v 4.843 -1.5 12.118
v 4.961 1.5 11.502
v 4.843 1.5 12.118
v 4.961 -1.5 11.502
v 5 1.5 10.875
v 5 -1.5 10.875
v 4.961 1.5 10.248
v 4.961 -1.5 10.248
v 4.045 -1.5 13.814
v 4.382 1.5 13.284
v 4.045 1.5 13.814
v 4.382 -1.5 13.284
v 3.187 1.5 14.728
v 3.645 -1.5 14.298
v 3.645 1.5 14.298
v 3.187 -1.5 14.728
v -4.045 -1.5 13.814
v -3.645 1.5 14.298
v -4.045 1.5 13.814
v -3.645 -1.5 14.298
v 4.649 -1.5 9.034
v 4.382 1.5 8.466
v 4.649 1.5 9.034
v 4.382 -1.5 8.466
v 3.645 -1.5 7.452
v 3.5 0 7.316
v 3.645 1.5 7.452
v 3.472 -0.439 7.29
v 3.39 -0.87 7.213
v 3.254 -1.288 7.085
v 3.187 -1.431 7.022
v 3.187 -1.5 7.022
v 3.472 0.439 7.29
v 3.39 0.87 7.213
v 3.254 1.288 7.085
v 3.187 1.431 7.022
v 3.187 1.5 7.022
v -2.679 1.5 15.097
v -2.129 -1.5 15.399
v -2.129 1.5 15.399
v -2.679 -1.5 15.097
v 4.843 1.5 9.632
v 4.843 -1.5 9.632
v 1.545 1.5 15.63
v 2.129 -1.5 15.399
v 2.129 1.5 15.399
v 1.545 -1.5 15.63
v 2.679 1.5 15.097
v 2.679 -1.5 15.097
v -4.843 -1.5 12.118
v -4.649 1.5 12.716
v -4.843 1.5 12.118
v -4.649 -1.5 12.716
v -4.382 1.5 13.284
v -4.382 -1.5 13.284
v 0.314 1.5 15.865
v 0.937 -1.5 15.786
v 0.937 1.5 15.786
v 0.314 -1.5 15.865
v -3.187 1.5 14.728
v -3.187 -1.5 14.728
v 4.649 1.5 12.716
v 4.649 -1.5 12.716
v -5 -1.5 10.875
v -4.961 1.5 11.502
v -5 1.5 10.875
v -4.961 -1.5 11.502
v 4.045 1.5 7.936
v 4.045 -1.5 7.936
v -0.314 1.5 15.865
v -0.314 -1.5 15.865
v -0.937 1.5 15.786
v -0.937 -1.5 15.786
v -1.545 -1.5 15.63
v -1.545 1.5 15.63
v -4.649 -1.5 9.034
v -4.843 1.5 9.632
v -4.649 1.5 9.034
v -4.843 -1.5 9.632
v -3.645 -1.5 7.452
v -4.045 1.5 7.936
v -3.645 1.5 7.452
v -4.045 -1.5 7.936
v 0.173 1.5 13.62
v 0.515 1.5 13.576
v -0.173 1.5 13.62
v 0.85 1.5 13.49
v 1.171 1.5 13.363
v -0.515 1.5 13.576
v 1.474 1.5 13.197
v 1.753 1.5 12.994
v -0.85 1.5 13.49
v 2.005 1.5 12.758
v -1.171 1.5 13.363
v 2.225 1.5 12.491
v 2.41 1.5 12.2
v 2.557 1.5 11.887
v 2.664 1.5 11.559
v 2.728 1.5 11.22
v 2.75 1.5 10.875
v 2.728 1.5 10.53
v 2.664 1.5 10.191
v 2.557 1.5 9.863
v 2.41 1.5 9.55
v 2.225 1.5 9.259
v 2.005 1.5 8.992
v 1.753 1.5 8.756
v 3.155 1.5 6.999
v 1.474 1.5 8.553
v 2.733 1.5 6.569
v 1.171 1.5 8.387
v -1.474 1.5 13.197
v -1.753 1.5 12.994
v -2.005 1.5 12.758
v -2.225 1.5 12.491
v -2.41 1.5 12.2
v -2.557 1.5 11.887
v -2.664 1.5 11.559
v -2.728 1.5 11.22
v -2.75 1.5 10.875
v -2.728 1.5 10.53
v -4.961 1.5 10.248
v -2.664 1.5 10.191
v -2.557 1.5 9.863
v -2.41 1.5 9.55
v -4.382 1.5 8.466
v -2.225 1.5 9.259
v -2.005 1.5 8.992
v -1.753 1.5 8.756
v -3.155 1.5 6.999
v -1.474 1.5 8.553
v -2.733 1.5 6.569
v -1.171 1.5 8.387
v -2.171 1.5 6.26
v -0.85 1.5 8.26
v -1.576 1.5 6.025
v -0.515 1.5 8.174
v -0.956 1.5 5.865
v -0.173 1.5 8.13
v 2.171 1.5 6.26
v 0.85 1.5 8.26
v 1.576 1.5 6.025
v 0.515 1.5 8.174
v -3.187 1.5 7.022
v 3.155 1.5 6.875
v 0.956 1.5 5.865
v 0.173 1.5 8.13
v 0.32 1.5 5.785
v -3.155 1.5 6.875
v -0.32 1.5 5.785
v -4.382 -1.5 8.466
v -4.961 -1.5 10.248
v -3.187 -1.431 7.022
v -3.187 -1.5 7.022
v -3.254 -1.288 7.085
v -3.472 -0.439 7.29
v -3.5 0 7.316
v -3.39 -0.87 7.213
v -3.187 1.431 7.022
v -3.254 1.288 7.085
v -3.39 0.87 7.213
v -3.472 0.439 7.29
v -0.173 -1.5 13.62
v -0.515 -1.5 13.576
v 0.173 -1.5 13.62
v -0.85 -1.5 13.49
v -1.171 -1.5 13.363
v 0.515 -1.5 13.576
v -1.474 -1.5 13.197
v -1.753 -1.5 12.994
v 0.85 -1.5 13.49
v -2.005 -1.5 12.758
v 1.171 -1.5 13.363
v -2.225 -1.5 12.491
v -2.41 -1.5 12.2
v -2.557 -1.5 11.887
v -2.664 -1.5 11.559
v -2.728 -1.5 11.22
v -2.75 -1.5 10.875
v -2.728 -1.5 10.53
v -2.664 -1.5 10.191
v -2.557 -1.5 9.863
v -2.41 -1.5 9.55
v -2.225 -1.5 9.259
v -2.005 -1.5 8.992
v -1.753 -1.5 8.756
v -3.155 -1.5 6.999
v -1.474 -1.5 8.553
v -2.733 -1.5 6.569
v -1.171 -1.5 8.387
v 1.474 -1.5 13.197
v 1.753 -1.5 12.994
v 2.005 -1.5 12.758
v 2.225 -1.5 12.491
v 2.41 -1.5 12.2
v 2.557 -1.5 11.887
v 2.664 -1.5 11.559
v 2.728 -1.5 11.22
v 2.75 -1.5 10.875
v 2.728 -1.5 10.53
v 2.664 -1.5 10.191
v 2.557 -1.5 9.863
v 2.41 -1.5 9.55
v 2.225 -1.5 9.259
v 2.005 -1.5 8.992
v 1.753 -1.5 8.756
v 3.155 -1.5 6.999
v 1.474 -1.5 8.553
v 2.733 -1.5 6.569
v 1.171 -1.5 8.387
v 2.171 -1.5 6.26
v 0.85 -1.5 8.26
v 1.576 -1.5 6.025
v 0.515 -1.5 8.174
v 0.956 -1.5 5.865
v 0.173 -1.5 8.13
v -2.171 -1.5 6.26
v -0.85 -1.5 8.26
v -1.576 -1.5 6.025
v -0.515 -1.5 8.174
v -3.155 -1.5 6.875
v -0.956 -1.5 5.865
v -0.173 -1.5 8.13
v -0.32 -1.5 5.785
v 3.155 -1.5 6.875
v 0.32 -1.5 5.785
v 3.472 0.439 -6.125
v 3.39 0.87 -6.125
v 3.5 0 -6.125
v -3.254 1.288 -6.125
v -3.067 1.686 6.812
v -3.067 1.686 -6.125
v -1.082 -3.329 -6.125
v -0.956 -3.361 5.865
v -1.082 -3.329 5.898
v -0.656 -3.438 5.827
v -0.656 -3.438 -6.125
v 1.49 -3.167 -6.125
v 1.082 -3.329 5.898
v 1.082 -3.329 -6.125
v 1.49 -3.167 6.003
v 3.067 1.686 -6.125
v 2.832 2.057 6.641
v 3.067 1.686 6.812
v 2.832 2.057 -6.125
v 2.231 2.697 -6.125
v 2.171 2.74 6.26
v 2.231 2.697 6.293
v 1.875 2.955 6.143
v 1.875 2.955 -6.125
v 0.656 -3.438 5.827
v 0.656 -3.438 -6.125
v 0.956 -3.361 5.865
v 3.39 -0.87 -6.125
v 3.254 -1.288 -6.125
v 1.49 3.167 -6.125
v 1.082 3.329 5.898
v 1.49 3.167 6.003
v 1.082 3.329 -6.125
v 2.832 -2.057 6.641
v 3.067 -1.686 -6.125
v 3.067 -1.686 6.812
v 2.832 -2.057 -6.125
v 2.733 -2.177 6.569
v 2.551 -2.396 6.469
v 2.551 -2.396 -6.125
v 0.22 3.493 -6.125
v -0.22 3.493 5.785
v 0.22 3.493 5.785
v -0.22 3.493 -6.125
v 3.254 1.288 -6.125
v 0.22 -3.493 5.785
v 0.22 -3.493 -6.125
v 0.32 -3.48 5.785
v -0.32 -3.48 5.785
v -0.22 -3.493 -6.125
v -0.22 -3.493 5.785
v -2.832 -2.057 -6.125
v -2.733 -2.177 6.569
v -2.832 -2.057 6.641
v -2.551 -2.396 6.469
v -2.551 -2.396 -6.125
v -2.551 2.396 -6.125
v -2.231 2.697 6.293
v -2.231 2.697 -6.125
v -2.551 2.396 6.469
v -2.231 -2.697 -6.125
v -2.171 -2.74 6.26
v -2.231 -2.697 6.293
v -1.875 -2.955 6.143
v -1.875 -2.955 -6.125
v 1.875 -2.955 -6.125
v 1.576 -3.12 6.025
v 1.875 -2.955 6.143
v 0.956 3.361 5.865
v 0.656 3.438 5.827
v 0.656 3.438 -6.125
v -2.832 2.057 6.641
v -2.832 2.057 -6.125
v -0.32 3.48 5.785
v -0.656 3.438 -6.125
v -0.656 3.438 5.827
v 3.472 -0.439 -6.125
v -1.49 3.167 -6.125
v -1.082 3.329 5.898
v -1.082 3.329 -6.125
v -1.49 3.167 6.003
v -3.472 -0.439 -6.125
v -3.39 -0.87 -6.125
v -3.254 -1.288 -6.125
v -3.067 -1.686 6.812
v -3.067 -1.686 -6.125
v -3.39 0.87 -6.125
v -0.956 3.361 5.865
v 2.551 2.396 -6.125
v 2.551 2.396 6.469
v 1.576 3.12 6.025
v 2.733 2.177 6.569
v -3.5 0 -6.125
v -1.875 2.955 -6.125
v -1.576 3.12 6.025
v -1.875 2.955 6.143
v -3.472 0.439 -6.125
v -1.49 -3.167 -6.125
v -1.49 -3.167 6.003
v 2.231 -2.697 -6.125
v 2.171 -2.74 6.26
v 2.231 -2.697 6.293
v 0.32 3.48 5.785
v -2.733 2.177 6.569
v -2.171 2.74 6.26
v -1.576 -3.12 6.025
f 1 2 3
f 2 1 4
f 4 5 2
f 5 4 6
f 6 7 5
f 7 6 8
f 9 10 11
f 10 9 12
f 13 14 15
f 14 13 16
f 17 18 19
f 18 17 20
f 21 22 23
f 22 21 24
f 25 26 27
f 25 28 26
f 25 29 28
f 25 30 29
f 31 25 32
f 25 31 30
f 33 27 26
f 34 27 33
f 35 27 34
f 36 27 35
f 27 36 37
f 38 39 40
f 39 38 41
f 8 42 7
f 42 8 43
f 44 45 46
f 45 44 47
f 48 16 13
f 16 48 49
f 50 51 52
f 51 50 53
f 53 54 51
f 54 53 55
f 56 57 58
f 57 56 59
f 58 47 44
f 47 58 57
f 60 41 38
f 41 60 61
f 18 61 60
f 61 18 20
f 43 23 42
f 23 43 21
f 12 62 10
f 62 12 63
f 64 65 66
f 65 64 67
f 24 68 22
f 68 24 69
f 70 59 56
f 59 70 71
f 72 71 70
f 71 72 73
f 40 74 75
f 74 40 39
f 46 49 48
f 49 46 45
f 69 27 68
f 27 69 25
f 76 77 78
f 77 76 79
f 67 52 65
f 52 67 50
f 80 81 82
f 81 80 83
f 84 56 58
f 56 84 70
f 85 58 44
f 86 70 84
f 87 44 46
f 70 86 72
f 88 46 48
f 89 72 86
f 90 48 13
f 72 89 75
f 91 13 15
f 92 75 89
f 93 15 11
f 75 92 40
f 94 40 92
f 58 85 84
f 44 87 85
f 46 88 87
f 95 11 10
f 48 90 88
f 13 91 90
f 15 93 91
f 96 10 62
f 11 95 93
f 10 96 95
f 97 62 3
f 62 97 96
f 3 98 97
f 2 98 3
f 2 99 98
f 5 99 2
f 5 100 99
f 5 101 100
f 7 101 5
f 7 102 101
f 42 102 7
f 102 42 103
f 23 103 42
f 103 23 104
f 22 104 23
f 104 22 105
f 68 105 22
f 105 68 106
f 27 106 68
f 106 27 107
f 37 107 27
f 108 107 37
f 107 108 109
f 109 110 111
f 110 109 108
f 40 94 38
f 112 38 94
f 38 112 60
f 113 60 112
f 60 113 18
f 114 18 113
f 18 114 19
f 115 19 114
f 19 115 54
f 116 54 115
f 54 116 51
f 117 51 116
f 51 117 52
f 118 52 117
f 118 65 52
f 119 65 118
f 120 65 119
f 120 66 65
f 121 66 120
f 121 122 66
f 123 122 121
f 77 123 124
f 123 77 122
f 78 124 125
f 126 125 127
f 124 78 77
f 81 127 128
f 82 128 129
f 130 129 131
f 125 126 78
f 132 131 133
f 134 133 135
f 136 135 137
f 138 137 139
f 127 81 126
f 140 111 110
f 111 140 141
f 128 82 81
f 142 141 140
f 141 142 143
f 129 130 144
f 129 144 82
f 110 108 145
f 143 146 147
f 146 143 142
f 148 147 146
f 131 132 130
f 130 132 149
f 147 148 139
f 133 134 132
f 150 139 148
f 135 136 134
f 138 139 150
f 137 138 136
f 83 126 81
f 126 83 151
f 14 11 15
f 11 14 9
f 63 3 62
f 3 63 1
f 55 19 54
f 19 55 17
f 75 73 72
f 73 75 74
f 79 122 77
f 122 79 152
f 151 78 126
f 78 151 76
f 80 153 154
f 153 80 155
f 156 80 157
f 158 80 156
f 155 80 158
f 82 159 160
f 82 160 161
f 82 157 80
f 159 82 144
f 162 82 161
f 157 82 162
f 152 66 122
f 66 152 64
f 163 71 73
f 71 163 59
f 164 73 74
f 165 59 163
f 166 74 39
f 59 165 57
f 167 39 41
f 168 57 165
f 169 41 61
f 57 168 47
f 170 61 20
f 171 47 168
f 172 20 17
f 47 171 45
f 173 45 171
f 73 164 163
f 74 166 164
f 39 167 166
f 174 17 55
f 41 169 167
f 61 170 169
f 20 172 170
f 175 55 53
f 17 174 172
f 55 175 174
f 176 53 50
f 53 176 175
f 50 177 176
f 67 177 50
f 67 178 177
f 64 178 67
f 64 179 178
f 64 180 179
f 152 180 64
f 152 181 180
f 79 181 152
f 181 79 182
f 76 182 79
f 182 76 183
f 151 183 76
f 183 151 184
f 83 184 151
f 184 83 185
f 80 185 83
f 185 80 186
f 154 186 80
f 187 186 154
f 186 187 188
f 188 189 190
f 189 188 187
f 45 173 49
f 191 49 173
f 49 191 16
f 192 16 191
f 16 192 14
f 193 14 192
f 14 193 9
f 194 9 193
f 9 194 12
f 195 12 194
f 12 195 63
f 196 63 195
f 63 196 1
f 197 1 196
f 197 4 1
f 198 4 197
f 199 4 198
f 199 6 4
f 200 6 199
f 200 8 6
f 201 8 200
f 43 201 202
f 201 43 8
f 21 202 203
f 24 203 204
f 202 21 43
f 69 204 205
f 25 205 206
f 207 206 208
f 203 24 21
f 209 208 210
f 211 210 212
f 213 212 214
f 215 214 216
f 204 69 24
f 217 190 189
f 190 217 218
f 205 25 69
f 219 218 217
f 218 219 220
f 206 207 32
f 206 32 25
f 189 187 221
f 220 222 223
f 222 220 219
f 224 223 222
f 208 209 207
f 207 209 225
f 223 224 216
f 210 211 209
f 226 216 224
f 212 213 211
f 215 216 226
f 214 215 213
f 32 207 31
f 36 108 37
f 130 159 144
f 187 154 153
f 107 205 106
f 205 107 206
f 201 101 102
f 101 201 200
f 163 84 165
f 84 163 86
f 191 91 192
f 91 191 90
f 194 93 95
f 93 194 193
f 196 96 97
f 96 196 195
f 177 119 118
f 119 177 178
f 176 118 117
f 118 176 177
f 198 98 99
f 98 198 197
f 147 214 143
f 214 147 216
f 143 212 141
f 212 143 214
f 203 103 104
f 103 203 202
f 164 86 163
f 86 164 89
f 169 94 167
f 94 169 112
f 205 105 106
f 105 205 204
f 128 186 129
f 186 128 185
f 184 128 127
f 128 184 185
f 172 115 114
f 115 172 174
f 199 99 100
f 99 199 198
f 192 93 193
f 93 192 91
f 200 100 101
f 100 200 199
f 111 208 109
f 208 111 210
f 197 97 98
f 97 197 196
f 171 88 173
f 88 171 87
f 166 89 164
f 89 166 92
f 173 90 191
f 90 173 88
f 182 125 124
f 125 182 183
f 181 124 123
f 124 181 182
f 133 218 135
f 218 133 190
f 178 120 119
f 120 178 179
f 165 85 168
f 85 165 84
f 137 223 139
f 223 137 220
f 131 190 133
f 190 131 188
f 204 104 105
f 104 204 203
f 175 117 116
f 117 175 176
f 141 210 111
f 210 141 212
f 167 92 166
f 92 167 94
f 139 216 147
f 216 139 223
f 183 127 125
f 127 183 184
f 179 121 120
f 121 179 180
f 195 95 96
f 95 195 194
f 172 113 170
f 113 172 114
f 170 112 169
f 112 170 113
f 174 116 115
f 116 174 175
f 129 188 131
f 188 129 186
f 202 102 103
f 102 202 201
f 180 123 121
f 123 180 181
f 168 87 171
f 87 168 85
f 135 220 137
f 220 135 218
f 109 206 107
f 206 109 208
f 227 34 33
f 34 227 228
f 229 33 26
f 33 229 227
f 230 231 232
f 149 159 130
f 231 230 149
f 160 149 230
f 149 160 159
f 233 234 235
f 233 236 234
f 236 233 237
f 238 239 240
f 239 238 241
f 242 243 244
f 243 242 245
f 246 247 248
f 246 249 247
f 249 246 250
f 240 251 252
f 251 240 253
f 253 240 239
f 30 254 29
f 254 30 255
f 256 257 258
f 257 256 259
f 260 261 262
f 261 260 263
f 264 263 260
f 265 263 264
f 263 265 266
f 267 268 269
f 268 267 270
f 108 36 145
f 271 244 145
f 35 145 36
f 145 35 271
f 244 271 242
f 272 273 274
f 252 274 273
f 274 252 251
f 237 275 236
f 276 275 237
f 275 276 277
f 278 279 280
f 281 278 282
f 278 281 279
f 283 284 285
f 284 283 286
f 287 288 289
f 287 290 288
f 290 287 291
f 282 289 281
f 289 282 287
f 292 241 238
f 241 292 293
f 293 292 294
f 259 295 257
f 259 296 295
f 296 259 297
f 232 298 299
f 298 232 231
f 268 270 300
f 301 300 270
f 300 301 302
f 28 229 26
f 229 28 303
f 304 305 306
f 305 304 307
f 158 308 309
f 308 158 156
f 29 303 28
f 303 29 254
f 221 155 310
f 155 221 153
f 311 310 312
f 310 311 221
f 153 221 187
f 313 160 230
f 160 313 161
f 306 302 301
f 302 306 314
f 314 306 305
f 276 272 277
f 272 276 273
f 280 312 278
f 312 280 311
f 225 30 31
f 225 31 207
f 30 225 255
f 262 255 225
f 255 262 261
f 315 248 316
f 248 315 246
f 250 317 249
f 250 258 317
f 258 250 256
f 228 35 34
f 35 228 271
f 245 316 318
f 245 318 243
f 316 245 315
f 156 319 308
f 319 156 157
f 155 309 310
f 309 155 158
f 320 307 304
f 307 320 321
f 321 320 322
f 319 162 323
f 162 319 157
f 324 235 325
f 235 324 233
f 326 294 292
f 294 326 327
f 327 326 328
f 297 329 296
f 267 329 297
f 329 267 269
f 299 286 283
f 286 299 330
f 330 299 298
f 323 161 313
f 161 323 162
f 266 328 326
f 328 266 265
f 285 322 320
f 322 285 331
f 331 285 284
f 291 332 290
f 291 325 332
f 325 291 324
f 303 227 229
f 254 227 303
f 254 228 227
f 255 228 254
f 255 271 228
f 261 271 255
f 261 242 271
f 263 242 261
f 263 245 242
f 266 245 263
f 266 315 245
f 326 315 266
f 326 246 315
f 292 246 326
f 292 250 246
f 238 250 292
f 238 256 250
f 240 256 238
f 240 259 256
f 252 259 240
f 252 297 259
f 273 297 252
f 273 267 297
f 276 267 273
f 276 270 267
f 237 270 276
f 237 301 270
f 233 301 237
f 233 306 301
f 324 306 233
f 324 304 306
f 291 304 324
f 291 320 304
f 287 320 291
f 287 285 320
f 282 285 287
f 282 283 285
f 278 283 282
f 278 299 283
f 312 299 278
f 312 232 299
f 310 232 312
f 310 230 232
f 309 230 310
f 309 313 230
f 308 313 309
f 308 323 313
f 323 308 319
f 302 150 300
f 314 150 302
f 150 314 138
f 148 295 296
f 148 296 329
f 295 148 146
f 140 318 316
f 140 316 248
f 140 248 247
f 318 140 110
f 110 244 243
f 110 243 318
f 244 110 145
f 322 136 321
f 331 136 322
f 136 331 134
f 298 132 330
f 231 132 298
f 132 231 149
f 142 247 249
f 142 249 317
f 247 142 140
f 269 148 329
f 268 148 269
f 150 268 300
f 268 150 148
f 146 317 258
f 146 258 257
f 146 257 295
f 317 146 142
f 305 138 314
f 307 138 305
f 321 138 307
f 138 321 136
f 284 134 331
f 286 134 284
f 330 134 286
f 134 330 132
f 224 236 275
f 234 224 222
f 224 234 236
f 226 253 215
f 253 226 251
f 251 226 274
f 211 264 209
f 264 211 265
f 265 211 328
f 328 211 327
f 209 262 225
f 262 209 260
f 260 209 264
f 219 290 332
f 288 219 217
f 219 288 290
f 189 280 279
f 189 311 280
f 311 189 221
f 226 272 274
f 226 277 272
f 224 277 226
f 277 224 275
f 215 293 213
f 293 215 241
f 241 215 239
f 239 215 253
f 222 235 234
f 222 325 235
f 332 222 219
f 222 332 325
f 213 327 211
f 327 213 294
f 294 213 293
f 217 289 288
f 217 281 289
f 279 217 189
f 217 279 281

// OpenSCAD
$fn=50;

length_to_hole=14.25;
hole=5.5;
diameter=7;

difference() {
	union() {
		translate([0,0,1])cylinder(r=diameter/2, h=14.25, center=true);
		translate([0,0,length_to_hole-6.125+hole/2])rotate([90,0,0]){
			difference() {
				cylinder(r=5,h=3,center=true);
				cylinder(r=hole/2,h=5,center=true);
			}
		}
	}
translate([0,3,length_to_hole-6.125+hole/2])rotate([90,0,0])cylinder(r=5.1,h=3,center=true);
translate([0,-3,length_to_hole-6.125+hole/2])rotate([90,0,0])cylinder(r=5.1,h=3,center=true);
}
